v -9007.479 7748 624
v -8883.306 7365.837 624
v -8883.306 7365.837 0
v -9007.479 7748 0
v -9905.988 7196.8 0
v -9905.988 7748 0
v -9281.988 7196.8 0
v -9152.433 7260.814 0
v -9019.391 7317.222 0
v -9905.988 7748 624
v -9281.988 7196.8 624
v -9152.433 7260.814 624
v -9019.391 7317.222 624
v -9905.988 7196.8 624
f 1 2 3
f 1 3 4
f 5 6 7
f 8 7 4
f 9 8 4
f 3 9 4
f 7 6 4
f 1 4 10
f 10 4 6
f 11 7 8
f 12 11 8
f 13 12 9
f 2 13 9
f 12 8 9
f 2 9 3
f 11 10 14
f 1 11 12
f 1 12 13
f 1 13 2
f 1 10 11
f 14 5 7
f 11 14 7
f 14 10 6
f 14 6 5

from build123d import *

# Parameters (mm, degrees)
EXTRUDE_1_DEPTH = 480
SCALE_1_SCALE   = 1.3


with BuildPart() as part:
    # 草图1 → 凸台-拉伸1 (new body)
    with BuildSketch(Plane.XY):
        with BuildLine():
            Line((-7619.991111067, 5536), (-7139.991111067, 5536))
            ThreePointArc((-7139.991111067, 5536), (-6989.477063432, 5607.677609574), (-6833.3126292, 5666.028511287))
            Line((-6833.3126292, 5666.028511287), (-6928.829756014, 5960))
            Line((-6928.829756014, 5960), (-7619.991111067, 5960))
            Line((-7619.991111067, 5960), (-7619.991111067, 5536))
        make_face()
    extrude(amount=EXTRUDE_1_DEPTH)


with BuildPart() as part_1:
    # 缩放比例1: scaled about (0, 0, 0)
    add(part.part.scale(SCALE_1_SCALE))


solid = part_1.part
